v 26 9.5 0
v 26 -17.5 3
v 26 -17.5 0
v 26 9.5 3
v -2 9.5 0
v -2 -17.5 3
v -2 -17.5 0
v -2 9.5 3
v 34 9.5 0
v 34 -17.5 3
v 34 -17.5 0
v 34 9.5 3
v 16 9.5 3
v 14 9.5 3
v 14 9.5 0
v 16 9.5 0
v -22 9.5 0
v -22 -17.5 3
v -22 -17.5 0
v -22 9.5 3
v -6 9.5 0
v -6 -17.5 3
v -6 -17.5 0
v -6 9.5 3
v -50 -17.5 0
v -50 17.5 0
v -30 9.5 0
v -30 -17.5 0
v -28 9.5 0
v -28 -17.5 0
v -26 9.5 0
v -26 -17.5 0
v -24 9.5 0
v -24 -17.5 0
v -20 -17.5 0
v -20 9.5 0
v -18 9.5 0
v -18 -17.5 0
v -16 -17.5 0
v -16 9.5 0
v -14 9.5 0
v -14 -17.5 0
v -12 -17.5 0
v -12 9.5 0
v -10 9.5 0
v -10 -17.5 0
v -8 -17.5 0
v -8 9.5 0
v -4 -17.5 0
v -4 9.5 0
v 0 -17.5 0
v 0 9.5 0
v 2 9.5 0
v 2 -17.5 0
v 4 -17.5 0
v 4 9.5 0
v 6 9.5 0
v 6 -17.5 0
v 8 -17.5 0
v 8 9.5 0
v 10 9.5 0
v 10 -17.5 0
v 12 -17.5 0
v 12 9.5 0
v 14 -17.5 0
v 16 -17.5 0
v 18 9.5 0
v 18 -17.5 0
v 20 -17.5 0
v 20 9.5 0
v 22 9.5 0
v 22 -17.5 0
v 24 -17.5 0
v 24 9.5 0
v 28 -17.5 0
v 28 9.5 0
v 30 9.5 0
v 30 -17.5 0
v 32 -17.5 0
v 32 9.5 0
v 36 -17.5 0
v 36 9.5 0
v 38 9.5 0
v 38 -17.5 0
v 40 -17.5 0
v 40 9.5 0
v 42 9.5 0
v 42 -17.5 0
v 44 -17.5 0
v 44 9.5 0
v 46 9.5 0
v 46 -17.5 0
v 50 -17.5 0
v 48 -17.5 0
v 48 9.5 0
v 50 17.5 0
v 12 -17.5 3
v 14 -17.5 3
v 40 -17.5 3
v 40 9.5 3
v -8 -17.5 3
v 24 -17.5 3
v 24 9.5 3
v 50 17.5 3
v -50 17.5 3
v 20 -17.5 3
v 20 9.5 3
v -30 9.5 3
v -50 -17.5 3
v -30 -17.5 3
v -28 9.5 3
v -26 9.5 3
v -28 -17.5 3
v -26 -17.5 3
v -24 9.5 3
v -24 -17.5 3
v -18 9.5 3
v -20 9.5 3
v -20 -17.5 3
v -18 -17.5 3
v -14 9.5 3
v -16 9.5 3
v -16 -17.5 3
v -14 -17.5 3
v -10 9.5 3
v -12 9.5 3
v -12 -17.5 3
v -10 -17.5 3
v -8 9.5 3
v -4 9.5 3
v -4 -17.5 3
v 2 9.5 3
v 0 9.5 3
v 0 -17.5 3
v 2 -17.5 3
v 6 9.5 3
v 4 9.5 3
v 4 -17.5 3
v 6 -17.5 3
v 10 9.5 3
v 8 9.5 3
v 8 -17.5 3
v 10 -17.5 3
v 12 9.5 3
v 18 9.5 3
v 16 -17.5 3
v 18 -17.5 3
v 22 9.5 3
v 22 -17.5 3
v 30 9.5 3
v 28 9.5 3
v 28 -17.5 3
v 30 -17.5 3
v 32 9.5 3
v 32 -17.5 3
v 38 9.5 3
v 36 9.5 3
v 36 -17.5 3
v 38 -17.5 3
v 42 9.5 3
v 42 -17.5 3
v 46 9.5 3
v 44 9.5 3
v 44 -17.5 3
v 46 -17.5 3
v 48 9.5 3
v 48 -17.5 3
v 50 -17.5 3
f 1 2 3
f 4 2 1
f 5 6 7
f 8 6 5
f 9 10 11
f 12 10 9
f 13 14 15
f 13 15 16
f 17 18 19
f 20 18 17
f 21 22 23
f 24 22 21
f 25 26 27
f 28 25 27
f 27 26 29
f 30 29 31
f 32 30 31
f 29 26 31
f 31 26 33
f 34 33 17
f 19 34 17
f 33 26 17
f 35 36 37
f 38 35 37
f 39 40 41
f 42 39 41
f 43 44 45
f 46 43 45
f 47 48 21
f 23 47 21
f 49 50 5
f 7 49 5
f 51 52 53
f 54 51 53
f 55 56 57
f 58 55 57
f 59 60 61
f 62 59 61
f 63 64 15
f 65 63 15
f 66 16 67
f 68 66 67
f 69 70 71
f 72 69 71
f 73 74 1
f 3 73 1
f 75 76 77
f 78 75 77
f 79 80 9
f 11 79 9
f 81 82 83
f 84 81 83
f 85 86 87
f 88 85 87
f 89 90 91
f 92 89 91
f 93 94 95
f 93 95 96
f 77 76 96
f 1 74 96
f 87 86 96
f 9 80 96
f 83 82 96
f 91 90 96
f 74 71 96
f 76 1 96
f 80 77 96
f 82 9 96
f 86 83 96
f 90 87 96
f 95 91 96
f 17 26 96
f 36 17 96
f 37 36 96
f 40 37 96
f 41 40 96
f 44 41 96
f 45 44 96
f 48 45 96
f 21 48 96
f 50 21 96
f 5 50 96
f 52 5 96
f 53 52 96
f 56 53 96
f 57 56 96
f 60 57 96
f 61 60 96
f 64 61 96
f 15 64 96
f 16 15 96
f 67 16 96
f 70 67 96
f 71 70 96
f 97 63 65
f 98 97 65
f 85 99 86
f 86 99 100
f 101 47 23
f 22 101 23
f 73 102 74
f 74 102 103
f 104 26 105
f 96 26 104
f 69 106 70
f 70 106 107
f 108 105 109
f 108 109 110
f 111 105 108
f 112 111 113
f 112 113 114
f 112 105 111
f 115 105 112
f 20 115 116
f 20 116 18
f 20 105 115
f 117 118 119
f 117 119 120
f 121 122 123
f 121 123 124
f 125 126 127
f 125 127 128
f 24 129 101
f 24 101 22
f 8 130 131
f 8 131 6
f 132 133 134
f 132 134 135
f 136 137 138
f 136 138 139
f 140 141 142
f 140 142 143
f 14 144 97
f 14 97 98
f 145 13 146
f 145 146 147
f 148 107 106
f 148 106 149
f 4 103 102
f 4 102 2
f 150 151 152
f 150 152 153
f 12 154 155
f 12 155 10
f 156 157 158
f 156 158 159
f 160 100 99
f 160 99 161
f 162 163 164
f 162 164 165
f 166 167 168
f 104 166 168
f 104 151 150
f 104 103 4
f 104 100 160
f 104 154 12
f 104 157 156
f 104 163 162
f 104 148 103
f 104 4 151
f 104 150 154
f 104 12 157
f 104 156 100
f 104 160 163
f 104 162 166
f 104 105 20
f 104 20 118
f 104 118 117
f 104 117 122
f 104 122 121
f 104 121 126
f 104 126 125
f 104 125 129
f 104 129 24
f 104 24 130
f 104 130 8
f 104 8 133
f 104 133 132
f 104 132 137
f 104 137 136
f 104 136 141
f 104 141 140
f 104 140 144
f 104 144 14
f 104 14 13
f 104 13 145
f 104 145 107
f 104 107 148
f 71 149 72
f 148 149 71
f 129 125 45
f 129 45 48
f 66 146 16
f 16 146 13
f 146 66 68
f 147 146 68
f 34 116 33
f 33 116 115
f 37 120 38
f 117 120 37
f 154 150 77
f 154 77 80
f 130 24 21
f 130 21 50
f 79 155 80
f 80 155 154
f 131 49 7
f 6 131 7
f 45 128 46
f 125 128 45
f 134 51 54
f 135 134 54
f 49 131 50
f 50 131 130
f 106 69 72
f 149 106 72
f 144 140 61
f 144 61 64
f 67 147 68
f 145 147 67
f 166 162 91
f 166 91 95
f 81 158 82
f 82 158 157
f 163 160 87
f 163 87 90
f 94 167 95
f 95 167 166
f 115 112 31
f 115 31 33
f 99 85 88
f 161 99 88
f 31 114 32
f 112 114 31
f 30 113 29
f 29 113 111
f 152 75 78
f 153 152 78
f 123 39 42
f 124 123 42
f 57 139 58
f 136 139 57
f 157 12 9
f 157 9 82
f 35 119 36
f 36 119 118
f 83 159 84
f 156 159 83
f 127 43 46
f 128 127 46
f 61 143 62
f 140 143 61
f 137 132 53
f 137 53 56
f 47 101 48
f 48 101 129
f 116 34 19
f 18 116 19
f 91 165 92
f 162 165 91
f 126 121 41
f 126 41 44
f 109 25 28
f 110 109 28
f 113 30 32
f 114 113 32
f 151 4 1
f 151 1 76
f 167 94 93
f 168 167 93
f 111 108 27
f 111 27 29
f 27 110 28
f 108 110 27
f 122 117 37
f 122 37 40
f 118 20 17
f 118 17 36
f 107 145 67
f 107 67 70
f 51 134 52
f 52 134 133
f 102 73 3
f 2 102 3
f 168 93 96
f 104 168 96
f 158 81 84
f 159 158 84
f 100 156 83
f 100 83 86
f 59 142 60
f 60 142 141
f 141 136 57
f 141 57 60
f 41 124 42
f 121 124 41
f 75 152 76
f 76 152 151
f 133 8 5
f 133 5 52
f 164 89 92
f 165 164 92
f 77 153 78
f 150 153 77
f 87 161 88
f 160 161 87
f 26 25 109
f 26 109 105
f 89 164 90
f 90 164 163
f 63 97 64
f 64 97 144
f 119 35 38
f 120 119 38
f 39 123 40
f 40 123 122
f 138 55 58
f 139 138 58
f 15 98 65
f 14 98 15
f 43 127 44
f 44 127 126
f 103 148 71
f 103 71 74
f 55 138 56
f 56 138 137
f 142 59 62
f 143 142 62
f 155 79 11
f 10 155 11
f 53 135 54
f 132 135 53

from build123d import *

# Parameters (mm, degrees)
F0_W     = 100
F0_H     = 35
F1_DEPTH = 3
F2_W     = 2
F2_H     = 35
F3_DEPTH = 3.001


with BuildPart() as f1:
    # F0 (on Top) → F1 (new body)
    with BuildSketch(Plane.XY):
        Rectangle(F0_W, F0_H)
    extrude(amount=F1_DEPTH)

    # F2 (on face) → F3 (cut, through all)
    with BuildSketch(Plane.XY.offset(3)):
        with Locations((47, -8)):
            Rectangle(F2_W, F2_H)
        with Locations((43, -8)):
            Rectangle(F2_W, F2_H)
        with Locations((39, -8)):
            Rectangle(F2_W, F2_H)
        with Locations((35, -8)):
            Rectangle(F2_W, F2_H)
        with Locations((31, -8)):
            Rectangle(F2_W, F2_H)
        with Locations((27, -8)):
            Rectangle(F2_W, F2_H)
        with Locations((23, -8)):
            Rectangle(F2_W, F2_H)
        with Locations((19, -8)):
            Rectangle(F2_W, F2_H)
        with Locations((15, -8)):
            Rectangle(F2_W, F2_H)
        with Locations((11, -8)):
            Rectangle(F2_W, F2_H)
        with Locations((7, -8)):
            Rectangle(F2_W, F2_H)
        with Locations((3, -8)):
            Rectangle(F2_W, F2_H)
        with Locations((-1, -8)):
            Rectangle(F2_W, F2_H)
        with Locations((-5, -8)):
            Rectangle(F2_W, F2_H)
        with Locations((-9, -8)):
            Rectangle(F2_W, F2_H)
        with Locations((-13, -8)):
            Rectangle(F2_W, F2_H)
        with Locations((-17, -8)):
            Rectangle(F2_W, F2_H)
        with Locations((-21, -8)):
            Rectangle(F2_W, F2_H)
        with Locations((-25, -8)):
            Rectangle(F2_W, F2_H)
        with Locations((-29, -8)):
            Rectangle(F2_W, F2_H)
    extrude(amount=-F3_DEPTH, mode=Mode.SUBTRACT)


solid = f1.part
